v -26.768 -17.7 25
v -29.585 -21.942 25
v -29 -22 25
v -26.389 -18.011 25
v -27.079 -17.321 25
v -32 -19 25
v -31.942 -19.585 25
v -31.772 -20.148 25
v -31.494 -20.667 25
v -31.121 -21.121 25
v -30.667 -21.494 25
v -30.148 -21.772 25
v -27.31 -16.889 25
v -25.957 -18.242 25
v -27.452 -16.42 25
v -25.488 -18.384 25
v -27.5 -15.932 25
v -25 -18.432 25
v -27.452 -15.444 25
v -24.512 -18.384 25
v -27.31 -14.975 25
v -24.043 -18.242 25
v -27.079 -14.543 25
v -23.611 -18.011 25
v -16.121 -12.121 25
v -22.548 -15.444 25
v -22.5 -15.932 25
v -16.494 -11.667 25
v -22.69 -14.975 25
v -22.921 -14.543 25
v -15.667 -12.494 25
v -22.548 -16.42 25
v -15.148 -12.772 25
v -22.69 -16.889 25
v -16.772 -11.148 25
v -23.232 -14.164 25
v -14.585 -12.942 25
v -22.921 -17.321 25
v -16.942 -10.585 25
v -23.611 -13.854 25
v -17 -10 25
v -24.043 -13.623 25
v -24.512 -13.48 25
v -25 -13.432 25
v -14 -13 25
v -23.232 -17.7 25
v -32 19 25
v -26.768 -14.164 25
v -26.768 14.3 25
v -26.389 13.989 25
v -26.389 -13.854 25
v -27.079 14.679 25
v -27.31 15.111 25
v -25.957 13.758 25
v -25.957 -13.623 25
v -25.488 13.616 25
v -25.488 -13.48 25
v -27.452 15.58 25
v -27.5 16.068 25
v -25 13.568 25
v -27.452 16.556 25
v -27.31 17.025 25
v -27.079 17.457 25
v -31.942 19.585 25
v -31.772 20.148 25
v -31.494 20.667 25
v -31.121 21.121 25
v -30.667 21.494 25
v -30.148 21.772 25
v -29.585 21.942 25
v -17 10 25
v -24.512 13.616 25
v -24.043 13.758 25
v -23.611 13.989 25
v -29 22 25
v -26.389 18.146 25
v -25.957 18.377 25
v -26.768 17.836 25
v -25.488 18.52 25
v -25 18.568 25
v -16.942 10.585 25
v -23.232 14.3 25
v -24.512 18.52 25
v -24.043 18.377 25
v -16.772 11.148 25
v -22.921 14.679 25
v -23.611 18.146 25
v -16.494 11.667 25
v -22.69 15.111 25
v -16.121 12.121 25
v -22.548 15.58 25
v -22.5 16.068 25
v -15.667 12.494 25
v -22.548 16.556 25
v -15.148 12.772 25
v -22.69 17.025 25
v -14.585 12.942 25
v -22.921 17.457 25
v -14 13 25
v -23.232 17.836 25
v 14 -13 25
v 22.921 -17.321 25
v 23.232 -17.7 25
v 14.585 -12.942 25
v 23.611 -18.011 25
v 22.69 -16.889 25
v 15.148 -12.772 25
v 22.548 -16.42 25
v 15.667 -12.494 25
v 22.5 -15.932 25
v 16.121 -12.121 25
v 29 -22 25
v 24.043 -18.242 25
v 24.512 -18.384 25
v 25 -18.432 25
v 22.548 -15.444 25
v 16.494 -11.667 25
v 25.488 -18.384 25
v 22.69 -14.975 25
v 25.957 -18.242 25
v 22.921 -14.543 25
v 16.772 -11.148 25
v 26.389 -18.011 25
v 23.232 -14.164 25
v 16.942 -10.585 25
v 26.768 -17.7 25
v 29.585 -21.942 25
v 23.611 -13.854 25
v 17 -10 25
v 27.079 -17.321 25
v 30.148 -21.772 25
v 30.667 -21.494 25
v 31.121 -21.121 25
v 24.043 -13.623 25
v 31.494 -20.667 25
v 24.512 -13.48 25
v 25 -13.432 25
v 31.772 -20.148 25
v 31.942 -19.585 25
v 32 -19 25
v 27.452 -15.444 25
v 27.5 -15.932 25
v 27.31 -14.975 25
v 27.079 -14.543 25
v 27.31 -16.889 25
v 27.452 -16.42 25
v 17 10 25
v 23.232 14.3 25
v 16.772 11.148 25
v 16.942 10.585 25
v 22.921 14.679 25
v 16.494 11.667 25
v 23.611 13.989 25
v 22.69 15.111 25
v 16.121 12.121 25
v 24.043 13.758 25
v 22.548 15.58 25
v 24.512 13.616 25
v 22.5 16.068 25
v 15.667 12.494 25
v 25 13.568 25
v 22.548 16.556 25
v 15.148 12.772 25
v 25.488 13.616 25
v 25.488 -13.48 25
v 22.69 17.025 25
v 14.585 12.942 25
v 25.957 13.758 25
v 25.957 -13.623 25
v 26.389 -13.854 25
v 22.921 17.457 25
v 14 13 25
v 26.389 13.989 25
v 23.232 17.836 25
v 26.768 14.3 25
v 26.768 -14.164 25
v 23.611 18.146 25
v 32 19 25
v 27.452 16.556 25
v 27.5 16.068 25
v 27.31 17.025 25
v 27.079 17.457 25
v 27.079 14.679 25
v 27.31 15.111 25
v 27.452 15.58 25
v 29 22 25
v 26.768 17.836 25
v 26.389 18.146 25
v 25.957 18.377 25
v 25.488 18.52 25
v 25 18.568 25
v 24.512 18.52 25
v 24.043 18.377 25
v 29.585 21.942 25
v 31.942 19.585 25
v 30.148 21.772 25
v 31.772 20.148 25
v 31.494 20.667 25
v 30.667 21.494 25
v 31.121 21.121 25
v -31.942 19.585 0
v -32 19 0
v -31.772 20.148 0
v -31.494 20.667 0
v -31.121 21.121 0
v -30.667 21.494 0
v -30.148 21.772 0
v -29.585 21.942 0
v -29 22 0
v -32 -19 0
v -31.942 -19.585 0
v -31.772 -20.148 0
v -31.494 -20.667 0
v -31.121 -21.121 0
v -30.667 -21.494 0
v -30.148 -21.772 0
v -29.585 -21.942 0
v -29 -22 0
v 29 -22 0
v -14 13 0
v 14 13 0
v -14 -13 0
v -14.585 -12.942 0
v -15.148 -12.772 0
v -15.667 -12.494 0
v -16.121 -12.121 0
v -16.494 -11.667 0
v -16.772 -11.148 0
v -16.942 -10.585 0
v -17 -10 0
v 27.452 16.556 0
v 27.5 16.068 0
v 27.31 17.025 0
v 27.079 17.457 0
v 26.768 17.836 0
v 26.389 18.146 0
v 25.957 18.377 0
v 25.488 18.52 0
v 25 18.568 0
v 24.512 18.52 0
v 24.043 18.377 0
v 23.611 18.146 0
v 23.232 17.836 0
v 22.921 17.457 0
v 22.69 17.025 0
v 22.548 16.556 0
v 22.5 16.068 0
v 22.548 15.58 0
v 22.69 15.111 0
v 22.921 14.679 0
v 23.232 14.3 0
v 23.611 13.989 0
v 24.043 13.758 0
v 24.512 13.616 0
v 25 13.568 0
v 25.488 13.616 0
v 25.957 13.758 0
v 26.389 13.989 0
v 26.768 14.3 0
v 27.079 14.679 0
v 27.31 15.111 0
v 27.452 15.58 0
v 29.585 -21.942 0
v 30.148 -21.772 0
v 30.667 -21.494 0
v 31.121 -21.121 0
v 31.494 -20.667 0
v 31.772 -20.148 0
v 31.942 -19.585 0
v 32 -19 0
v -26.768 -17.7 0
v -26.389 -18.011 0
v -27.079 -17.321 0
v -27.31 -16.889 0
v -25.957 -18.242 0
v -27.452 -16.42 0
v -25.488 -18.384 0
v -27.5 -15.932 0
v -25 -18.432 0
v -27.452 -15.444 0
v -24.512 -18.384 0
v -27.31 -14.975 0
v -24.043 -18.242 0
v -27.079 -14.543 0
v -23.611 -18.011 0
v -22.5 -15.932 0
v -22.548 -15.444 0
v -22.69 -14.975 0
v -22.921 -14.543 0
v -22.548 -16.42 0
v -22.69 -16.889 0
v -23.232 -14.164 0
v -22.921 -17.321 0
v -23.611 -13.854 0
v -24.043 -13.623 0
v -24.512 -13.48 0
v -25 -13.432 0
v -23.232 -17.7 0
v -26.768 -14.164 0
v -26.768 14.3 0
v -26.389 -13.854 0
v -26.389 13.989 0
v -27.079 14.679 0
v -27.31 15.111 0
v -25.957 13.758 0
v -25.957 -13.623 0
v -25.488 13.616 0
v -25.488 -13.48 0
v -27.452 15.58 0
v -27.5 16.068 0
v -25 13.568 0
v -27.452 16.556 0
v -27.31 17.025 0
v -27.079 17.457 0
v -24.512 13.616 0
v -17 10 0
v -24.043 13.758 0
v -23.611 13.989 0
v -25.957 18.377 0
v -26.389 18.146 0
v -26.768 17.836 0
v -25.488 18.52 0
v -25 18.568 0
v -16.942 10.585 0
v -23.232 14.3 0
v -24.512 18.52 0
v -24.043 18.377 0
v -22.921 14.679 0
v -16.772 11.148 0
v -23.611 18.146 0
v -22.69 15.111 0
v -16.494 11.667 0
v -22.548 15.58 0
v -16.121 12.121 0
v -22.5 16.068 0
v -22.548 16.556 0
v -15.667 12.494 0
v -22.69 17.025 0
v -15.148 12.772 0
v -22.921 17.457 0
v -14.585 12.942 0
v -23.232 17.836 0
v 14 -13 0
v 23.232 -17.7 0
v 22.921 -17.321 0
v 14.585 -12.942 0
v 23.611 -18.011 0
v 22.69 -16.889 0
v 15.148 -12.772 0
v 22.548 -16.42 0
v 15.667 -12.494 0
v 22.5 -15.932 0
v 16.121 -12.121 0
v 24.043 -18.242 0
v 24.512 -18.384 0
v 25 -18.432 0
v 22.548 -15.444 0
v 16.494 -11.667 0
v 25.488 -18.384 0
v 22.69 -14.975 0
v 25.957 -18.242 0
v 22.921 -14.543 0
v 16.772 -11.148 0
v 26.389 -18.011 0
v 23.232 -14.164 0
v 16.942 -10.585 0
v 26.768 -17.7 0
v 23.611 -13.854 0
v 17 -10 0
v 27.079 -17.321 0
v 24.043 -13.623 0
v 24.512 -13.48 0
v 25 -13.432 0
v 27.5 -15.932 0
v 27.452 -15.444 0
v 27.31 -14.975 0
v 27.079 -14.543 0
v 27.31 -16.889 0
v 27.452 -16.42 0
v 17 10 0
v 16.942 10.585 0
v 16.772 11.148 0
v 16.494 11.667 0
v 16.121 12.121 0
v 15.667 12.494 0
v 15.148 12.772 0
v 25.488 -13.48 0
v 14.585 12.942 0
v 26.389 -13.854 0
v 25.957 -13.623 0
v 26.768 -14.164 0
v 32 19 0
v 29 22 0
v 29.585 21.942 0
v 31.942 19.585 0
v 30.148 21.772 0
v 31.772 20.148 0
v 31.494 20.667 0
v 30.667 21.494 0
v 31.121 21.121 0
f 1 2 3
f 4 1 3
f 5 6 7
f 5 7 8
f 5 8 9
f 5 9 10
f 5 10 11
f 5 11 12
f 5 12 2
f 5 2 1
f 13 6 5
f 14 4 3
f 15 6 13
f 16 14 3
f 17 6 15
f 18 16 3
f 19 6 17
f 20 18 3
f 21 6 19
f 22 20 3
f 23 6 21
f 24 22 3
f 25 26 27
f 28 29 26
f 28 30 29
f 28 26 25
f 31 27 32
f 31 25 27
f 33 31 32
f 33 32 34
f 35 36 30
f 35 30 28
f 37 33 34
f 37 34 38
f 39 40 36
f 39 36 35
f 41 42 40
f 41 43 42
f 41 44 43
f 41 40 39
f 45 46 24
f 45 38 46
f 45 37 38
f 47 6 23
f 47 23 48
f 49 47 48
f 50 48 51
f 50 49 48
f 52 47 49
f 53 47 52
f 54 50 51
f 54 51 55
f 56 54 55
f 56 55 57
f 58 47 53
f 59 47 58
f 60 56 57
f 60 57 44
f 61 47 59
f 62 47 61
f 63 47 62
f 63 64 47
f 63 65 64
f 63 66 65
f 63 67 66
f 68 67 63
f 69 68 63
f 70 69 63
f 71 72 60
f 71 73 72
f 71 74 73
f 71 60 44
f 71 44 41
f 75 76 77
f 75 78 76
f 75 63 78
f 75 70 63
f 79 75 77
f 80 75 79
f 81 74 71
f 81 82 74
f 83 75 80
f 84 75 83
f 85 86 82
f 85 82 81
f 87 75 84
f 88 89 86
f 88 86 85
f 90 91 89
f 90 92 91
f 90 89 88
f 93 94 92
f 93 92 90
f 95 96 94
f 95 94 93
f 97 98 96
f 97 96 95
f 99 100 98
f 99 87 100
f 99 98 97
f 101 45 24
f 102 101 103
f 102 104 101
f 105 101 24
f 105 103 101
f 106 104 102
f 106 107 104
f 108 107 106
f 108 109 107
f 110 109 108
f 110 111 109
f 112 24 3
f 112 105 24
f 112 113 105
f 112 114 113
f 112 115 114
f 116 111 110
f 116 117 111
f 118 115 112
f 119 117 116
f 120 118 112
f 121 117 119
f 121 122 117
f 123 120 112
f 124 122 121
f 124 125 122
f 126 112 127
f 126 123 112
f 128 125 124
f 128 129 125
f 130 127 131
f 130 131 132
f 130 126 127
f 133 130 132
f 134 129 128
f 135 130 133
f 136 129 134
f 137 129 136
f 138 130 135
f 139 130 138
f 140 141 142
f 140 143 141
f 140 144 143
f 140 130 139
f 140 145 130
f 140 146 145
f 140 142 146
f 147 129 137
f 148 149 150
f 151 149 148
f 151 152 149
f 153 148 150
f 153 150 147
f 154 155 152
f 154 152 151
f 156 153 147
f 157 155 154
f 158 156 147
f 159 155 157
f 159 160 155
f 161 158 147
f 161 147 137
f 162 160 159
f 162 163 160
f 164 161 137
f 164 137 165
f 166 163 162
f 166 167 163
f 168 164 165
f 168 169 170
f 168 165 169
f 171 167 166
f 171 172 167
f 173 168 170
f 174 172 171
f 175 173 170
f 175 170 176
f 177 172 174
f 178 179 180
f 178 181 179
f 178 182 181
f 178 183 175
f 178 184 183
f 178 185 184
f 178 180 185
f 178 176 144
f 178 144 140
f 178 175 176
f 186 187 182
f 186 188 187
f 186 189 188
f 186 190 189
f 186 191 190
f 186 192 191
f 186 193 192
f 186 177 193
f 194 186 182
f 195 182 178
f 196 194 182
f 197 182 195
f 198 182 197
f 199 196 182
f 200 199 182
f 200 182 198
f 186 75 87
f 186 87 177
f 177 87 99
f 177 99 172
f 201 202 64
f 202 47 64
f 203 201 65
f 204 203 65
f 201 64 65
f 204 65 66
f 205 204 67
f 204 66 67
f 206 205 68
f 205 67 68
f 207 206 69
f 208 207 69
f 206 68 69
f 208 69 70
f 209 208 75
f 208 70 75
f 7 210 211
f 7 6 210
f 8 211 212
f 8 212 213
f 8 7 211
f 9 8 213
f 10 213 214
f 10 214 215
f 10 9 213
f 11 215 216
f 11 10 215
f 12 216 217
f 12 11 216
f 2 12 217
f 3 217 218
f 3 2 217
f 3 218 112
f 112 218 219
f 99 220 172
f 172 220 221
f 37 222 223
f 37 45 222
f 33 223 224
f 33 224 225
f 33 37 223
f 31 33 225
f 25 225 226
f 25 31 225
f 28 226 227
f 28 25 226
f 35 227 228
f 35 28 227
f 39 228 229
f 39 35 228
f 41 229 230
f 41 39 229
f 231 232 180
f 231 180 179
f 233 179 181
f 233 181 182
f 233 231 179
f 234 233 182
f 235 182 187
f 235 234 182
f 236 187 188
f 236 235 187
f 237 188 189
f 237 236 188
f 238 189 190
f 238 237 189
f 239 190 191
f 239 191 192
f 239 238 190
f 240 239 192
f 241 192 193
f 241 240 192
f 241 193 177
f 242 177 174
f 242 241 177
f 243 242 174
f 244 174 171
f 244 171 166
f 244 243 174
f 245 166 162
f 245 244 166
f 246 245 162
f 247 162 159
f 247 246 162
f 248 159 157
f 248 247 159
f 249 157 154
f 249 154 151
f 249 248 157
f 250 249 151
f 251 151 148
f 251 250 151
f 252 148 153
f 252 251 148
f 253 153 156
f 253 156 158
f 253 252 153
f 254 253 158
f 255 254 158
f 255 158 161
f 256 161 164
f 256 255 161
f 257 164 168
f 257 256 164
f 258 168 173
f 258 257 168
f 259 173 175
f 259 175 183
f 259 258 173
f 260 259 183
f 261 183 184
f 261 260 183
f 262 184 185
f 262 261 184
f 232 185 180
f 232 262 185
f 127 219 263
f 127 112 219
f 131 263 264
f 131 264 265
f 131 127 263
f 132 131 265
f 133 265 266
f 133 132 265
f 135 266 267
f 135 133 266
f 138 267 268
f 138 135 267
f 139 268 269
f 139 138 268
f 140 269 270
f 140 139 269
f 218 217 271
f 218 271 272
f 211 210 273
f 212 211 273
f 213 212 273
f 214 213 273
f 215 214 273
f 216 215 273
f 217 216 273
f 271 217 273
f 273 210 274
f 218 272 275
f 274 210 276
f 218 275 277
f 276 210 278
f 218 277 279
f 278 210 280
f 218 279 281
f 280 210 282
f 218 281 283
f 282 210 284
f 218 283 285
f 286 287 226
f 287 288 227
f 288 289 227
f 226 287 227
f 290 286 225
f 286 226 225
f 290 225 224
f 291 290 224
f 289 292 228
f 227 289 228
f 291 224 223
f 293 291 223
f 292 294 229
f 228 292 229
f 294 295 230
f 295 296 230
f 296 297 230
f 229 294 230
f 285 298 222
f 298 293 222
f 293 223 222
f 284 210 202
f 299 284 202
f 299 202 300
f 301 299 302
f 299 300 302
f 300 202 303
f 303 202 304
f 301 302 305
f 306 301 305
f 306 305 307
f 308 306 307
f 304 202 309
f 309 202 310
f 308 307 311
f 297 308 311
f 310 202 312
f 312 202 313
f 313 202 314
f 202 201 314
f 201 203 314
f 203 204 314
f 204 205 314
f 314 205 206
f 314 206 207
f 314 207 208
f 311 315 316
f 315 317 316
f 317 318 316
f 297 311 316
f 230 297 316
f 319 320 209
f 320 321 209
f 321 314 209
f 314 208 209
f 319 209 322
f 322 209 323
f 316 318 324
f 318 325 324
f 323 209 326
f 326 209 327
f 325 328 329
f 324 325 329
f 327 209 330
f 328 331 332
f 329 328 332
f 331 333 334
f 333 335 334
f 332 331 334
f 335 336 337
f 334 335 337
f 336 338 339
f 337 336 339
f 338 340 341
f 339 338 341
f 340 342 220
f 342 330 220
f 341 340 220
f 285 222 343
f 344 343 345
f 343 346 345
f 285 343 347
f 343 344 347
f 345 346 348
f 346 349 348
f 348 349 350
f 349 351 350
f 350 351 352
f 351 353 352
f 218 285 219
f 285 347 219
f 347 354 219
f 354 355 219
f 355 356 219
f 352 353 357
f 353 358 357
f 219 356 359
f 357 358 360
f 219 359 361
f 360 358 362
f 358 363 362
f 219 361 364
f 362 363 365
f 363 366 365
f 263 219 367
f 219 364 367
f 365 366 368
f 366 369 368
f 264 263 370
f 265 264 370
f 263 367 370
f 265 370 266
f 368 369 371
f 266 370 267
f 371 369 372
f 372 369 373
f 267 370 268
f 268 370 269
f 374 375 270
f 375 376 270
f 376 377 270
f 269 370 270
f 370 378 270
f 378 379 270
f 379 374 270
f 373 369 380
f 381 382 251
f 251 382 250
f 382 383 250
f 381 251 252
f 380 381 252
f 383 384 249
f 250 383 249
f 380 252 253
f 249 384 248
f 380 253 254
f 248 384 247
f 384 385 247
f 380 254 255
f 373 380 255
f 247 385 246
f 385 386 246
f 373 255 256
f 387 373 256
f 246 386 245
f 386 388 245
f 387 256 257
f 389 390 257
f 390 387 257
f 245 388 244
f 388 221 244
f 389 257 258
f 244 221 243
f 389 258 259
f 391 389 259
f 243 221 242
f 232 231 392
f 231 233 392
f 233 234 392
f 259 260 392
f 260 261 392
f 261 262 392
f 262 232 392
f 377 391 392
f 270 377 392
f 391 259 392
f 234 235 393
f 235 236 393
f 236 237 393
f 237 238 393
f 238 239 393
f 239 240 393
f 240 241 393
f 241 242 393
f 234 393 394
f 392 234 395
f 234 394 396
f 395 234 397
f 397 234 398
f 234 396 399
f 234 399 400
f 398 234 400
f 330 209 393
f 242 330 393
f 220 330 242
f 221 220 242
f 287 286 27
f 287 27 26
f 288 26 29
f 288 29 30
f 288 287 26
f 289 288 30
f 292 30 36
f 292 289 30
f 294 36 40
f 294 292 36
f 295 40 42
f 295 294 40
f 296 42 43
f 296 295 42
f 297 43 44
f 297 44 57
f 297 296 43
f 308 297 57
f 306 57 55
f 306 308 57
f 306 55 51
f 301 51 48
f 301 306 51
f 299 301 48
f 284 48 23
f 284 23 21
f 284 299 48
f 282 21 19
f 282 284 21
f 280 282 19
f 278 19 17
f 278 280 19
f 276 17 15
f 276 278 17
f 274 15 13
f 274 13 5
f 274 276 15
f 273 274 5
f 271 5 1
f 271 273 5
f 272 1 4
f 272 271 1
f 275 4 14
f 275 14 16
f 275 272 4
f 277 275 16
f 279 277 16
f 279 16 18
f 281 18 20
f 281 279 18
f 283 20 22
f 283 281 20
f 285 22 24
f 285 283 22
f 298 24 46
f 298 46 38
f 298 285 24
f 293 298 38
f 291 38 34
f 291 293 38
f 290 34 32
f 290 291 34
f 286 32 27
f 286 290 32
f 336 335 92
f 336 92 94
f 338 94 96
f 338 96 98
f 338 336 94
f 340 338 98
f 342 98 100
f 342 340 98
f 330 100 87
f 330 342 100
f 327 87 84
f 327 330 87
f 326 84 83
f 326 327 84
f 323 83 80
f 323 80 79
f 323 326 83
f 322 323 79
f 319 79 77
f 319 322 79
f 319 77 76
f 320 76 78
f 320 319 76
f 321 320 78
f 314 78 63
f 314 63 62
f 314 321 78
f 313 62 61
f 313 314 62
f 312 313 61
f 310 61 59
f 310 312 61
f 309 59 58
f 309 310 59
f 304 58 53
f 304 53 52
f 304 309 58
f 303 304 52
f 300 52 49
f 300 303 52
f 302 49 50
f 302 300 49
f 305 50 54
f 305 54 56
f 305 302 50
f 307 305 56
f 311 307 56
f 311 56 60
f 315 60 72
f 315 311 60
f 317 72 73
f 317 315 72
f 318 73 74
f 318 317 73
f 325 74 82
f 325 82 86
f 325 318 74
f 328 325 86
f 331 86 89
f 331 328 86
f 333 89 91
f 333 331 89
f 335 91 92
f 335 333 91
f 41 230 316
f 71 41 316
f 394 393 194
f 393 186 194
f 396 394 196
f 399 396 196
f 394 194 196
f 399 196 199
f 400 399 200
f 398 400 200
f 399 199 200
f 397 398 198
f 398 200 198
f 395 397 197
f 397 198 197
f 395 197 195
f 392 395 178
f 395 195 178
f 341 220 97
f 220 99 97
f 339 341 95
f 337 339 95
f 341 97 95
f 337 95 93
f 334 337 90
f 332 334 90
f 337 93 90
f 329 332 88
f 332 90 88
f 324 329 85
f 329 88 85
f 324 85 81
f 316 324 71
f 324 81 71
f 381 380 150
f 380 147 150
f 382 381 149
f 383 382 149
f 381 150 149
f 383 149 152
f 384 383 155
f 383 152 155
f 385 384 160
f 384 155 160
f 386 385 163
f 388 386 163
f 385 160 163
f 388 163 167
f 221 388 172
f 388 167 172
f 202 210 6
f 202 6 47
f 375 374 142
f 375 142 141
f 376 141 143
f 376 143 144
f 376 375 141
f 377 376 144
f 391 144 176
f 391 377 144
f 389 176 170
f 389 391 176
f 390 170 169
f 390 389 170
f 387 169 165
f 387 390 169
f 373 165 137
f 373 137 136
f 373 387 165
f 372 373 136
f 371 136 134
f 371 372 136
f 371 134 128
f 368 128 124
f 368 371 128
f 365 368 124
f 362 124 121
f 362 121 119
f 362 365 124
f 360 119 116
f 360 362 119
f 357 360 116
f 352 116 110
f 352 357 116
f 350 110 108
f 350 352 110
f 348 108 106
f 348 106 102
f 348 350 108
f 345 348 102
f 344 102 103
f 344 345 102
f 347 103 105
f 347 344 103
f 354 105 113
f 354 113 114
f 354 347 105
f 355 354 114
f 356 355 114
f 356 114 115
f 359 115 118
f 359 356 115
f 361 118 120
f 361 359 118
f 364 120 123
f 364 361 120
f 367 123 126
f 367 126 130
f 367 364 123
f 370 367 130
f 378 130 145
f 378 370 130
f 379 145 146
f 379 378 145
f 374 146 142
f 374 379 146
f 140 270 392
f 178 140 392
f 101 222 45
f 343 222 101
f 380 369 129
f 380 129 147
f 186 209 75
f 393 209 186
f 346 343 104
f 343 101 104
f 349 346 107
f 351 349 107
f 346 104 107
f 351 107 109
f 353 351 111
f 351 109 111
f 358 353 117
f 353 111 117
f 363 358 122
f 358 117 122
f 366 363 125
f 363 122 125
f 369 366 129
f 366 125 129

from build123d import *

# Parameters (mm, degrees)
SKETCH_1_W      = 64
SKETCH_1_H      = 44
SKETCH_1_R      = 2.5
SKETCH_1_W_2    = 34
SKETCH_1_H_2    = 26
EXTRUDE_1_DEPTH = 25
FILLET_1_R      = 3


with BuildPart() as part:
    # 草图1 → 凸台-拉伸1 (new body)
    with BuildSketch(Plane.XY):
        Rectangle(SKETCH_1_W, SKETCH_1_H)
        with Locations((-25, 16.06779661)):
            Circle(SKETCH_1_R, mode=Mode.SUBTRACT)
        with Locations((-25, -15.93220339)):
            Circle(SKETCH_1_R, mode=Mode.SUBTRACT)
        with Locations((25, -15.93220339)):
            Circle(SKETCH_1_R, mode=Mode.SUBTRACT)
        with Locations((25, 16.06779661)):
            Circle(SKETCH_1_R, mode=Mode.SUBTRACT)
        Rectangle(SKETCH_1_W_2, SKETCH_1_H_2, mode=Mode.SUBTRACT)
    extrude(amount=EXTRUDE_1_DEPTH)

    # 圆角1
    fillet_1_edges = [part.edges().sort_by_distance(p)[0] for p in [
        (17, -13, 12.5),
        (17, 13, 12.5),
        (-17, 13, 12.5),
        (-17, -13, 12.5),
        (32, -22, 12.5),
        (-32, -22, 12.5),
        (-32, 22, 12.5),
        (32, 22, 12.5),
    ]]
    fillet(fillet_1_edges, radius=FILLET_1_R)


solid = part.part
